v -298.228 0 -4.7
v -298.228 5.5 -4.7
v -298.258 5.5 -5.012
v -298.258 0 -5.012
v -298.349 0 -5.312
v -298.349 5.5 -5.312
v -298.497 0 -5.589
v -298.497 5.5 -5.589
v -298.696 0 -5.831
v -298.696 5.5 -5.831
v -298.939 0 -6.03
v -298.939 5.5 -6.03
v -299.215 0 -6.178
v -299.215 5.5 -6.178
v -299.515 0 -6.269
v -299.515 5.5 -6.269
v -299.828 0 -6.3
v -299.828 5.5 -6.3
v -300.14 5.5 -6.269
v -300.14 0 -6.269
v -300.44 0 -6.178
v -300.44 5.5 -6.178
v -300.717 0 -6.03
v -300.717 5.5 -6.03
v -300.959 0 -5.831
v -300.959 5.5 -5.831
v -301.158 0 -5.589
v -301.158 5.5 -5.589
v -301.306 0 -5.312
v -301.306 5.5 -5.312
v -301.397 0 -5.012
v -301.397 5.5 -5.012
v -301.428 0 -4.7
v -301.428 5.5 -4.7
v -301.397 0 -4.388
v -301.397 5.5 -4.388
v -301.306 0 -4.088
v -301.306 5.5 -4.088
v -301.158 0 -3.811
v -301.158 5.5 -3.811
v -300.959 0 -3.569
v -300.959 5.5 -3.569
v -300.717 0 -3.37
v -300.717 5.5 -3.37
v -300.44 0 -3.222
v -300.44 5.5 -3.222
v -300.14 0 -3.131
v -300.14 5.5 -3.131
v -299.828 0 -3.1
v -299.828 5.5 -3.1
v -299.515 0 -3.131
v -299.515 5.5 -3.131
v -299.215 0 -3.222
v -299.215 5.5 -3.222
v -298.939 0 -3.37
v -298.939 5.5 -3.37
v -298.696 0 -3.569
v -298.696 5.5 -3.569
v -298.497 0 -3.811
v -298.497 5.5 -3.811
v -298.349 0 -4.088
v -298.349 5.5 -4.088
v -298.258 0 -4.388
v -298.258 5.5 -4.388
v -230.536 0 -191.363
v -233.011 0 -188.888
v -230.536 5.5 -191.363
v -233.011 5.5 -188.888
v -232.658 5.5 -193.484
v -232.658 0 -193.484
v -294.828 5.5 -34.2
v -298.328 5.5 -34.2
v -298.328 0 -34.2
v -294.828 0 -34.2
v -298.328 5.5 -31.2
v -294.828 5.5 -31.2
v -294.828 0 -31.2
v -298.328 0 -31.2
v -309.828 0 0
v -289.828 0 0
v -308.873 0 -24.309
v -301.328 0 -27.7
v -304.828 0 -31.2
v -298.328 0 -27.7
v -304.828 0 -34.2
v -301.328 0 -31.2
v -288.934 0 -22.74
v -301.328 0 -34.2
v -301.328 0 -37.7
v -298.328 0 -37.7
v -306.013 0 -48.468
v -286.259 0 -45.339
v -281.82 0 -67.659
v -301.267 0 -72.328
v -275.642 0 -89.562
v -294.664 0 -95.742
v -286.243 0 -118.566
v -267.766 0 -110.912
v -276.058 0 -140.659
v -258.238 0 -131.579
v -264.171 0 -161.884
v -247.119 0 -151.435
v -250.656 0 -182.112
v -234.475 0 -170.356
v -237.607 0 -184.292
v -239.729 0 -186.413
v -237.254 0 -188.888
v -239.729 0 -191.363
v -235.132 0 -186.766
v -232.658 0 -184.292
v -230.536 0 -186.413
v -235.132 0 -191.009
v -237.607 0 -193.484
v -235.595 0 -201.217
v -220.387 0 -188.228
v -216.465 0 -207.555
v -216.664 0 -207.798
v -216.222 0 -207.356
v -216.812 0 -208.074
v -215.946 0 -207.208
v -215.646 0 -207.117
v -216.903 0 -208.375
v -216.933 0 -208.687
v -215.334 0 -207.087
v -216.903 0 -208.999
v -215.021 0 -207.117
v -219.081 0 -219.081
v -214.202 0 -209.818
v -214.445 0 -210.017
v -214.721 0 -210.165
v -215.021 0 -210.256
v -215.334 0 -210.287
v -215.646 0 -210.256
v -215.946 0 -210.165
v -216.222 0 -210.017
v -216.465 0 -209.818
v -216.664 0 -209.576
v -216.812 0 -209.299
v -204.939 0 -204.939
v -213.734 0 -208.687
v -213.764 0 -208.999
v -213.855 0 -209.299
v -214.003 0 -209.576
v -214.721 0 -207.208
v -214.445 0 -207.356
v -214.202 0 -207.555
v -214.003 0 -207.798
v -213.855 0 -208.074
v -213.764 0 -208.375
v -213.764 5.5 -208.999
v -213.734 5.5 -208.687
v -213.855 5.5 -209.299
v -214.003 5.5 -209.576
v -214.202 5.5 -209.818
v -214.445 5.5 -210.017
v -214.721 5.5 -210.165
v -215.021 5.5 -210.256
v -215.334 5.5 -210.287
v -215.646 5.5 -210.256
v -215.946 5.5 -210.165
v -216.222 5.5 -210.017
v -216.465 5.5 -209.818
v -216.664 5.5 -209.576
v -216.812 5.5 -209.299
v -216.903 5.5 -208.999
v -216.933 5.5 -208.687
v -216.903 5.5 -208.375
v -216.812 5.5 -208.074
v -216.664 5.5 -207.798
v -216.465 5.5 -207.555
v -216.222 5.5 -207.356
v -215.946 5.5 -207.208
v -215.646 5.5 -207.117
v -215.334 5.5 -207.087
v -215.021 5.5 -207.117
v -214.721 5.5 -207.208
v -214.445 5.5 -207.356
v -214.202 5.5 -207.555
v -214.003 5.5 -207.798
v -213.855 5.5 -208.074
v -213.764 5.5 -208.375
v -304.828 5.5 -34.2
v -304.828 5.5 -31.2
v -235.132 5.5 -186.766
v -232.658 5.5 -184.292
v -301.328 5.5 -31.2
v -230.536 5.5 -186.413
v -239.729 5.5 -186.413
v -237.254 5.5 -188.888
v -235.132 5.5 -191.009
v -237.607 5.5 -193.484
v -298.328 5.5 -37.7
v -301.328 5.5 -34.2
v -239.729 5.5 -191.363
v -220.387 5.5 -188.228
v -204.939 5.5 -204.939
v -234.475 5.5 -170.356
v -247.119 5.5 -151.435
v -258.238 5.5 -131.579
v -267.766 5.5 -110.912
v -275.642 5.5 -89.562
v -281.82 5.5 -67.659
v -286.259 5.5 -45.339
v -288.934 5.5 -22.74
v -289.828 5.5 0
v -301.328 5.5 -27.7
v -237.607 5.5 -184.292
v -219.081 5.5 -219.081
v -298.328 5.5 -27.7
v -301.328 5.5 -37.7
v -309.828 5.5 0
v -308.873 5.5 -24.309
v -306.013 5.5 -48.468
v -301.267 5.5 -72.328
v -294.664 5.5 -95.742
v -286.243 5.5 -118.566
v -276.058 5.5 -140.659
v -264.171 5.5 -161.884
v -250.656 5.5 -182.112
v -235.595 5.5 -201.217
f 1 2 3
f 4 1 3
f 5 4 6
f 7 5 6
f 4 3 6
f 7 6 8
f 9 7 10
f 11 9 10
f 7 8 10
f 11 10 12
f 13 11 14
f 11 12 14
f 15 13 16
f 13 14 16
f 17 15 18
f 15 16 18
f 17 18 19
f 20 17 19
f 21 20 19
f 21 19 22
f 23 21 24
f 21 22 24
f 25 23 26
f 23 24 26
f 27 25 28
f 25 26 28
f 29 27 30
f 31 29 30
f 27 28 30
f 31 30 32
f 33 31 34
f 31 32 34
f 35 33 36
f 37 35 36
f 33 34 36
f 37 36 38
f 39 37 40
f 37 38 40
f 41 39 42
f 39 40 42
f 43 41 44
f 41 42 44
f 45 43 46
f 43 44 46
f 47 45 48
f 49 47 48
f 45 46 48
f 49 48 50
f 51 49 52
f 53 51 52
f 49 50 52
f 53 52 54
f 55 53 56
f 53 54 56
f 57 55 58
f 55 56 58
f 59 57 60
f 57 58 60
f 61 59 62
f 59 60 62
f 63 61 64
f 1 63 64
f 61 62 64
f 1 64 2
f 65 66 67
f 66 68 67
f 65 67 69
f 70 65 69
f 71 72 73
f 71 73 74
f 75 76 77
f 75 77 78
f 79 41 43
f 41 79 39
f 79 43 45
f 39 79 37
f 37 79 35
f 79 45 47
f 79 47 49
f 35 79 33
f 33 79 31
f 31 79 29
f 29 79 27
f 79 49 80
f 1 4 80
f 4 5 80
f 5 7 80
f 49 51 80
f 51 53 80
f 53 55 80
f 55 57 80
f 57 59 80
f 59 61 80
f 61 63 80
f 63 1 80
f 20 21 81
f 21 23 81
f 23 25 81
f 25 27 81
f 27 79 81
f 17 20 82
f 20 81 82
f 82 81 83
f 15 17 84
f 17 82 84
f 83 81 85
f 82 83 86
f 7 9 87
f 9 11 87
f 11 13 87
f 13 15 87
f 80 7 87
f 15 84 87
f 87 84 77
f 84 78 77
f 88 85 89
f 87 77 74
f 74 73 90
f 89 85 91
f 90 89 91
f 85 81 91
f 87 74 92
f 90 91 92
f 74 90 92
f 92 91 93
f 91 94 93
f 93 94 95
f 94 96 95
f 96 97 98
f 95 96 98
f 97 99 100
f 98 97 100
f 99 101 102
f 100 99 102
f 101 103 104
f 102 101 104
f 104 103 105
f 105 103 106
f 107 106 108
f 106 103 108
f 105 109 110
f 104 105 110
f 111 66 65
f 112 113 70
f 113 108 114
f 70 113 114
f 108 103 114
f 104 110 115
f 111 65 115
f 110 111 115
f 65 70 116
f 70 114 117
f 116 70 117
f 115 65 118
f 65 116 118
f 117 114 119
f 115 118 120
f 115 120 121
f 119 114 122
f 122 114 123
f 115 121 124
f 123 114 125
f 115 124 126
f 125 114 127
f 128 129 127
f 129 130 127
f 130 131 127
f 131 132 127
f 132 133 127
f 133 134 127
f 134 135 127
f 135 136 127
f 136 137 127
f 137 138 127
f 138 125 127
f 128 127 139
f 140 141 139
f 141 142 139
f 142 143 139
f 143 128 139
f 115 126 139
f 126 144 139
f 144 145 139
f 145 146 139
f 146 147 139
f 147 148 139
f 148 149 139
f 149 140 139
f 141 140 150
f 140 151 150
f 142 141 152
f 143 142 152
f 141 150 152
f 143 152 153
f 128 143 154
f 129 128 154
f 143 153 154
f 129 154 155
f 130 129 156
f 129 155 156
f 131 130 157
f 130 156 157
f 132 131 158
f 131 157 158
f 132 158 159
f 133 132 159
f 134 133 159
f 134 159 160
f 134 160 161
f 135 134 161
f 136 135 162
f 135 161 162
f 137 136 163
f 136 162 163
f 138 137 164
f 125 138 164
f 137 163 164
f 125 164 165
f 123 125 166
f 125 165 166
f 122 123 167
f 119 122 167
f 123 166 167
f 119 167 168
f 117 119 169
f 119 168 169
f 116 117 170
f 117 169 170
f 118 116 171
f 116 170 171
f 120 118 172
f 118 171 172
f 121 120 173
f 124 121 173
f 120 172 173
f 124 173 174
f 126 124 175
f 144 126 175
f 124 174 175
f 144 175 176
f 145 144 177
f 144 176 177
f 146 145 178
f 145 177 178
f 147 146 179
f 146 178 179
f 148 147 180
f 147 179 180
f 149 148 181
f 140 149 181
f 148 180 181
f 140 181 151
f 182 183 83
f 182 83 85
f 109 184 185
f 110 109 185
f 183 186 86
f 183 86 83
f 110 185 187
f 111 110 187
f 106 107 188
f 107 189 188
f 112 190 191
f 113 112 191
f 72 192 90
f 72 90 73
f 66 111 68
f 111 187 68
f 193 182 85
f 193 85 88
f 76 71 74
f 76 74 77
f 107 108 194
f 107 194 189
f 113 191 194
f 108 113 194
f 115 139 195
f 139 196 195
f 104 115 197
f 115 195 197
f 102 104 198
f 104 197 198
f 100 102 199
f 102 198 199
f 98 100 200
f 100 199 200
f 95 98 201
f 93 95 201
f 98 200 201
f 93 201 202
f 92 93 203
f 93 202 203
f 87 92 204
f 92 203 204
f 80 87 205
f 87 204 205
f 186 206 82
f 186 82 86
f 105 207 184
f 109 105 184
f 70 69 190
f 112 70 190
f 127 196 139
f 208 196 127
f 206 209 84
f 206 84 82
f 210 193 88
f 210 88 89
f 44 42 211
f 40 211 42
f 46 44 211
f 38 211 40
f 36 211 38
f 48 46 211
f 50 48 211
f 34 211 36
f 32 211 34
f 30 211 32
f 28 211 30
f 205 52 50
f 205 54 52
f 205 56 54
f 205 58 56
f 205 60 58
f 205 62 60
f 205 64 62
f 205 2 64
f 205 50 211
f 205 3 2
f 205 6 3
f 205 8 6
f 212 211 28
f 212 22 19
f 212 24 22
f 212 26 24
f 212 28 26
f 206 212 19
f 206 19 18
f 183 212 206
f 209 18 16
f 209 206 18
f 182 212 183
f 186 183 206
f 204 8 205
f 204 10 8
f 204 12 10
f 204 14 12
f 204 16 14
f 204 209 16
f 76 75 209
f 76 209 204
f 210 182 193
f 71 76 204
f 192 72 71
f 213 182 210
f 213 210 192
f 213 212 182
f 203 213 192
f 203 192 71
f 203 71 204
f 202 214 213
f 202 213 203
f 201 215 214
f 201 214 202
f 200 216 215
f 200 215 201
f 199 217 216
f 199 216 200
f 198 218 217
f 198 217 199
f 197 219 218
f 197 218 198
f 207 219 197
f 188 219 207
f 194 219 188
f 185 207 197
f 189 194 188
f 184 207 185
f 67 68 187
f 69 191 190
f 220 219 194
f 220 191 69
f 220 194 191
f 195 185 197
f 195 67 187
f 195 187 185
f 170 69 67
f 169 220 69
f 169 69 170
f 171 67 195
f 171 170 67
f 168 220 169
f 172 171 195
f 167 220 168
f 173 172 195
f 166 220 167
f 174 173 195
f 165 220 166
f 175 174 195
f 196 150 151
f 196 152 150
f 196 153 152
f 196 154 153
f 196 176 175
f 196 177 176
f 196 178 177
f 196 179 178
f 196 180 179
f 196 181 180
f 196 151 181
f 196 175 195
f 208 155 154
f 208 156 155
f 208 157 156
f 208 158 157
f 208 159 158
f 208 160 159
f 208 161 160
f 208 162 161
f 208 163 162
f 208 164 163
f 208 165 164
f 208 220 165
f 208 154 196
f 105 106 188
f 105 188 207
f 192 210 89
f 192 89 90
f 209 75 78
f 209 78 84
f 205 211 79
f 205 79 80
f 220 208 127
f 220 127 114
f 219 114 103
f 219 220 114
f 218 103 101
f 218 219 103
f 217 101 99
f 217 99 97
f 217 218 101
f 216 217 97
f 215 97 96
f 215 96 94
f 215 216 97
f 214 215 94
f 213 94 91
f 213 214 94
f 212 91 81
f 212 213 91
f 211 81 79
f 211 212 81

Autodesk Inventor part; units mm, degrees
ref_plane "YZ Plane" through (0, 0, 0) normal (1, 0, 0) x (0, 1, 0)
ref_plane "XZ Plane" through (0, 0, 0) normal (0, 1, 0) x (-1, 0, 0)
ref_plane "XY Plane" through (0, 0, 0) normal (0, 0, 1) x (1, 0, 0)
sketch "スケッチ1" plane through (0, 0, 0) normal (0, 1, 0) x (-1, 0, 0)
  circle A0 centre (0, 0) radius 178.1675
  circle A1 centre (0, 0) radius 157.8276
  line L0 (168.1877, 0) -> (166.7488, -21.9529)
  line L1 (168.1877, 0) -> (130.1721, 2.4917) construction
  line L2 (249.4344, 0) -> (-249.4344, 0) projected
  line L3 (166.7488, -21.9529) -> (156.7702, -21.2989)
  line L4 (156.7702, -21.2989) -> (158.2091, 0.654) construction
  line L5 (158.2091, 0.654) -> (168.1877, 0)
  line L6 (157.4896, -10.3224) -> (0, 0)
  line L7 (166.7488, -21.9529) -> (162.4568, -43.5302)
  line L8 (162.4568, -43.5302) -> (152.649, -41.5793) construction
  line L9 (152.649, -41.5793) -> (156.9409, -20.002) construction
  line L10 (156.9409, -20.002) -> (166.7488, -21.9529) construction
  line L11 (162.4568, -43.5302) -> (155.3851, -64.3626)
  line L12 (155.3851, -64.3626) -> (145.9158, -61.1482) construction
  line L13 (145.9158, -61.1482) -> (152.9875, -40.3158) construction
  line L14 (152.9875, -40.3158) -> (162.4568, -43.5302) construction
  line L15 (155.3851, -64.3626) -> (145.6548, -84.0938)
  line L16 (145.6548, -84.0938) -> (136.6861, -79.6709) construction
  line L17 (136.6861, -79.6709) -> (146.4164, -59.9397) construction
  line L18 (146.4164, -59.9397) -> (155.3851, -64.3626) construction
  line L19 (0, 0) -> (111.6009, -111.6009)
  line L20 (145.6548, -84.0938) -> (137.3401, -78.5381) construction
  line L21 (137.3401, -78.5381) -> (125.1176, -96.8305) construction
  line L22 (125.1176, -96.8305) -> (133.4323, -102.3862) construction
  line L23 (133.4323, -102.3862) -> (145.6548, -84.0938)
  line L24 (133.4323, -102.3862) -> (125.9139, -95.7927) construction
  line L25 (125.9139, -95.7927) -> (111.4082, -112.3332) construction
  line L26 (111.4082, -112.3332) -> (118.9266, -118.9266)
  line L27 (118.9266, -118.9266) -> (133.4323, -102.3862)
  line L28 (111.6009, -111.6009) -> (118.9266, -118.9266)
  line L29 (166.7488, -21.9529) -> (176.7274, -22.6069) construction
  line L30 (118.9266, -118.9266) -> (125.9834, -125.9834)
  point P0 (154.795, -30.7906)
  point P1 (149.4517, -50.732)
  point P2 (141.5512, -69.8053)
  point P3 (131.2288, -87.6843)
  point P4 (118.661, -104.0629)
  point P5 (157.8276, 0)
  point P6 (178.1675, 0)
  dimension "d0" = 22
  dimension "d1" = 10
  dimension "d2" = 45
  dimension "d4" = 315.6551
extrude "押し出し1" add sketch "スケッチ1" along normal blind 5.5 contours L30 L27 L23 L15 L11 L7 L0 L2 A0 | L28 A1 L2 L0 L7 L11 L15 L23 L27
sketch "スケッチ2" plane through (0, 5.5, 0) normal (0, 1, 0) x (1, 0, 0)
  circle A0 centre (0, 0) radius 309.8276
  line L0 (-168.1877, 0) -> (-166.7488, 21.9529) projected
  line L1 (-166.7488, 21.9529) -> (-162.4568, 43.5302) projected
  line L2 (-162.4568, 43.5302) -> (-155.3851, 64.3626) projected
  line L3 (-155.3851, 64.3626) -> (-145.6548, 84.0938) projected
  line L4 (-133.4323, 102.3862) -> (-145.6548, 84.0938) projected
  line L5 (-118.9266, 118.9266) -> (-133.4323, 102.3862) projected
  line L6 (-167.4682, 10.9764) -> (-166.0294, 32.9293)
  line L7 (-166.0294, 32.9293) -> (-275.7938, 40.1237)
  line L8 (-275.7938, 40.1237) -> (-277.2327, 18.1708)
  line L9 (-277.2327, 18.1708) -> (-167.4682, 10.9764)
  line L10 (-164.6028, 32.7415) -> (-160.3108, 54.3188)
  line L11 (-160.3108, 54.3188) -> (-268.1972, 75.7787)
  line L12 (-268.1972, 75.7787) -> (-272.4892, 54.2015)
  line L13 (-272.4892, 54.2015) -> (-164.6028, 32.7415)
  circle A1 centre (-166.7488, 21.9529) radius 11
  circle A2 centre (-162.4568, 43.5302) radius 11
  line L14 (-158.921, 53.9464) -> (-151.8493, 74.7789)
  line L15 (-151.8493, 74.7789) -> (-256.0116, 110.1372)
  line L16 (-256.0116, 110.1372) -> (-263.0833, 89.3047)
  line L17 (-263.0833, 89.3047) -> (-158.921, 53.9464)
  circle A3 centre (-155.3851, 64.3626) radius 11
  arc A4 (-275.7591, 62.4834) -> (-281.3553, 41.7349) centre (-166.7488, 21.9529) ccw
  line L18 (-178.1663, 0.654) -> (-158.2091, -0.654)
  line L19 (-158.2091, -0.654) -> (-156.7702, 21.2989)
  line L20 (-156.7702, 21.2989) -> (-176.7274, 22.6069)
  line L21 (-176.7274, 22.6069) -> (-178.1663, 0.654)
  line L22 (-177.4468, 11.6305) -> (-275.7938, 40.1237)
  line L23 (-176.7274, 22.6069) -> (-176.008, 33.5834)
  line L24 (-176.008, 33.5834) -> (-275.7591, 62.4834)
  line L25 (-275.7938, 40.1237) -> (-281.3553, 41.7349)
  circle A5 centre (0, 0) radius 137.8276
  line L26 (0, 0) -> (-219.0812, 219.0812)
  line L27 (-111.6009, 111.6009) -> (-125.9834, 125.9834) projected
  line L28 (-433.7586, 0) -> (433.7586, 0) projected
  circle A6 centre (0, 0) radius 279.8276 construction
  arc A7 (-111.6009, 111.6009) -> (-157.8276, 0) centre (0, 0) ccw projected
  point P0 (-158.1662, 0)
  point P1 (-137.8276, 0)
  point P2 (-97.4588, 97.4588)
  point P3 (-309.8276, 0)
  dimension "d7" = 22
  dimension "d10" = 20
  dimension "d11" = 100
  dimension "d12" = 30
  dimension "d14" = 20
  dimension "d17" = 122
extrude "押し出し2" add sketch "スケッチ2" against normal blind 5.5 contours L26 L5 L4 L3 A3 L15 L16 L17 A2 L11 L12 L24 A4 L25 L8 L9 L21 L18 L28 A0 | L18 L21 L9 L0 | L0 A1 L19 L28 | A5 L28 A7 A1 A2 A3 L26 | L26 A7 A3 L3 L4 L5 | A1 L21 L20 L0 | L9 L21 A1 | L0 L20 L19 A1 | L19 A7 L28 | L6 A1 L1 | L20 L23 A1 L6 | L1 A1 A7 L19 L20 | L22 L7 L23 A1 L21 | L9 L8 L22 | A1 L23 L21 | A1 A7 L19 | A7 A3 L2 L3 | A3 A7 | A2 L10 L1 | A1 L7 L24 L13 | A2 A7 A1 | L13 L24 L12 L11 A2 | L1 L2 A2 A7 | A1 L23 L7 | L25 A4 L24 L12 L13 L7 | A7 A1 | A7 A2 A3 | L3 L14 A3 | L10 A2 L2 | L13 L12 L24 | A7 A2 | A3 L14 L2 | L17 L16 L15 A3
sketch "スケッチ3" plane through (0, 5.5, 0) normal (0, 1, 0) x (1, 0, 0)
  circle A0 centre (0, 0) radius 289.8276
  arc A1 (-97.4588, 97.4588) -> (-137.8276, 0) centre (0, 0) ccw projected
  line L0 (-97.4588, 97.4588) -> (-219.0812, 219.0812) projected
  line L1 (-309.8276, 0) -> (-137.8276, 0) projected
  arc A2 (-219.0812, 219.0812) -> (-309.8276, 0) centre (0, 0) ccw projected
  point P0 (-289.8276, 0)
  point P1 (-204.939, 204.939)
  dimension "d21" = 20
extrude "押し出し3" cut sketch "スケッチ3" against normal through all contours L0 A1 L1 A0 picked at (-207.353, 118.7807)
sketch "スケッチ4" plane through (0, 5.5, 0) normal (0, 1, 0) x (1, 0, 0)
  circle A0 centre (-299.8276, 4.7) radius 1.6
  line L0 (-304.8276, 34.2) -> (-294.8276, 34.2)
  line L1 (-294.8276, 34.2) -> (-294.8276, 31.2)
  line L2 (-294.8276, 31.2) -> (-304.8276, 31.2)
  line L3 (-304.8276, 31.2) -> (-304.8276, 34.2)
  line L4 (-301.3276, 37.7) -> (-298.3276, 37.7)
  line L5 (-298.3276, 37.7) -> (-298.3276, 27.7)
  line L6 (-298.3276, 27.7) -> (-301.3276, 27.7)
  line L7 (-301.3276, 27.7) -> (-301.3276, 37.7)
  line L8 (-309.8276, 0) -> (-289.8276, 0) projected
  line L9 (0, 0) -> (-215.9005, 89.4289) construction
  line L10 (-371.7931, 0) -> (61.9655, 0) projected
  circle A1 centre (-215.3335, 208.6867) radius 1.6
  line L11 (-239.7287, 191.3626) -> (-232.6576, 184.2915)
  line L12 (-232.6576, 184.2915) -> (-230.5363, 186.4128)
  line L13 (-230.5363, 186.4128) -> (-237.6074, 193.4839)
  line L14 (-237.6074, 193.4839) -> (-239.7287, 191.3626)
  line L15 (-239.7287, 186.4128) -> (-237.6074, 184.2915)
  line L16 (-237.6074, 184.2915) -> (-230.5363, 191.3626)
  line L17 (-230.5363, 191.3626) -> (-232.6576, 193.4839)
  line L18 (-232.6576, 193.4839) -> (-239.7287, 186.4128)
  line L19 (-219.0812, 219.0812) -> (-204.939, 204.939)
  point P0 (-294.8276, 32.7)
  point P1 (-298.3276, 32.7)
  point P2 (-299.8276, 37.7)
  point P3 (-299.8276, 34.2)
  point P4 (-299.8276, 27.7)
  point P5 (-299.8276, 0)
  point P6 (-299.8276, 0)
  point P7 (-231.597, 185.3522)
  point P8 (-234.0718, 187.8271)
  point P9 (-238.668, 185.3522)
  point P10 (-236.1932, 187.8271)
  point P11 (-231.597, 192.4232)
  point P12 (-212.0101, 212.0101)
  point P13 (-212.0101, 212.0101)
  point P14 (-301.3276, 34.2)
  point P15 (-301.3276, 31.2)
  point P16 (-298.3276, 31.2)
  point P17 (-298.3276, 34.2)
  point P18 (-233.0112, 188.8877)
  point P19 (-235.1325, 191.009)
  point P20 (-237.2538, 188.8877)
  point P21 (-235.1325, 186.7664)
  dimension "d22" = 3
  dimension "d23" = 10
  dimension "d24" = 27.7
  dimension "d25" = 4.7
  dimension "d26" = 3.2
  dimension "d27" = 22.5
extrude "押し出し4" cut sketch "スケッチ4" against normal through all
properties part number "front_under" material "木材 (カエデ材)"
